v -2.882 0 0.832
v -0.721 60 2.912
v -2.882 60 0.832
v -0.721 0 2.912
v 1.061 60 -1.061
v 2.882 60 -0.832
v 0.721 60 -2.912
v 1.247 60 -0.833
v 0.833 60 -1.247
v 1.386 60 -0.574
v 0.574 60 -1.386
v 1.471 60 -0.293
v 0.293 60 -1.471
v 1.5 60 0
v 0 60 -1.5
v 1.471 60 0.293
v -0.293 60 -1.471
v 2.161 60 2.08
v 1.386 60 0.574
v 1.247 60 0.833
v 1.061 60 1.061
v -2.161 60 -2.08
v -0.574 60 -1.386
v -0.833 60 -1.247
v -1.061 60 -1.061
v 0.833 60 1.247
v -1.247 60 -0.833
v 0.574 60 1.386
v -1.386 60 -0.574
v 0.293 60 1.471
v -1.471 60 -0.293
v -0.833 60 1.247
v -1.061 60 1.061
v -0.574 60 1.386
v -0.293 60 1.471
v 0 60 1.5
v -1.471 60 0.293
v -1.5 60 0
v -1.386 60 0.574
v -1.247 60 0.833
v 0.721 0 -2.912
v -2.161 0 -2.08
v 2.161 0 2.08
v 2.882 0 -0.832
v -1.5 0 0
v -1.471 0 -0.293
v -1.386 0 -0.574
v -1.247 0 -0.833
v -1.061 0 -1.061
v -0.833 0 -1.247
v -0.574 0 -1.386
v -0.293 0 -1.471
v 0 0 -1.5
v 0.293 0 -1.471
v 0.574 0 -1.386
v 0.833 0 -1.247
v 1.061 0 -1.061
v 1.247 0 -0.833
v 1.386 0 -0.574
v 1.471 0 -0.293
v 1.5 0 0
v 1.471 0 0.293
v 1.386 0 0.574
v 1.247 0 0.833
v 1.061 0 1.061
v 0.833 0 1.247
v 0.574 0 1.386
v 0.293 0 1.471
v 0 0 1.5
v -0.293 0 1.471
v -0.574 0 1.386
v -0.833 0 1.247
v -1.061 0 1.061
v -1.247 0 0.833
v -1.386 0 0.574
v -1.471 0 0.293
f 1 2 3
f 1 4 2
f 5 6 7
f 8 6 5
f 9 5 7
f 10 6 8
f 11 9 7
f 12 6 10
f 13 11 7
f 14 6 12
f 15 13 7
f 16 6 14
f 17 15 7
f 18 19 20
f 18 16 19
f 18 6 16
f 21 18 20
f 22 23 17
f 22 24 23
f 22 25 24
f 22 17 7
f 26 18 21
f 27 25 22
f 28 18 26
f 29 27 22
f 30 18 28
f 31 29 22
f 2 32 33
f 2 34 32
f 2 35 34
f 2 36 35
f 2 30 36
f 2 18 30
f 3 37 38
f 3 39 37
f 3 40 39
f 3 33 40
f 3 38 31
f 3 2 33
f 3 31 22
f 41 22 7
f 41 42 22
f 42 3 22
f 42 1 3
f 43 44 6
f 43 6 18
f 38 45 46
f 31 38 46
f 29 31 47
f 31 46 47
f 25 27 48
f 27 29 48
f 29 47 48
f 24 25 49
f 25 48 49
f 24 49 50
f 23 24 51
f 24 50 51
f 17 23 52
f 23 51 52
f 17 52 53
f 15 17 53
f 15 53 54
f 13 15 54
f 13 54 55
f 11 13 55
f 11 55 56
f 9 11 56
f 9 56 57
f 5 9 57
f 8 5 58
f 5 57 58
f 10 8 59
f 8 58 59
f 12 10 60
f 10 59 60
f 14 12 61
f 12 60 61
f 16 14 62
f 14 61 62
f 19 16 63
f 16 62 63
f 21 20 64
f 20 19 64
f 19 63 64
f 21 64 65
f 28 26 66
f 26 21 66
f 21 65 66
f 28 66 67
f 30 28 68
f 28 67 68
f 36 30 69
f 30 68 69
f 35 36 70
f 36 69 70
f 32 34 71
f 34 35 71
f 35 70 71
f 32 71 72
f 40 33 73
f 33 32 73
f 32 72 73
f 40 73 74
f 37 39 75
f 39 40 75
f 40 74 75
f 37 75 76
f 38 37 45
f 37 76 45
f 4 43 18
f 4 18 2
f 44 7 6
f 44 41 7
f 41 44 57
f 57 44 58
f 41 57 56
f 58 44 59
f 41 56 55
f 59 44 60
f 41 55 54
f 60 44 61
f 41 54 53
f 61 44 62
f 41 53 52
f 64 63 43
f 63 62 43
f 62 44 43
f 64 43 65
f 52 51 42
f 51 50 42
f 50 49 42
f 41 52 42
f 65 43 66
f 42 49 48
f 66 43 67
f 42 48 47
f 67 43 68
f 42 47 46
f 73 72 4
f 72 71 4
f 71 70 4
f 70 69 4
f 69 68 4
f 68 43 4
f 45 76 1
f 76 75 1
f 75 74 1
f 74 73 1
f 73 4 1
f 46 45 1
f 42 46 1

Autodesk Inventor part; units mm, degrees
ref_plane "YZ Plane" through (0, 0, 0) normal (1, 0, 0) x (0, 1, 0)
ref_plane "XZ Plane" through (0, 0, 0) normal (0, 1, 0) x (-1, 0, 0)
ref_plane "XY Plane" through (0, 0, 0) normal (0, 0, 1) x (1, 0, 0)
sketch "Sketch1" plane through (0, 0, 0) normal (0, 1, 0) x (-1, 0, 0)
  circle A0 centre (0, 0) radius 1.5
  line L0 (-0.7211, -2.912) -> (-2.8825, -0.8315)
  line L1 (-2.8825, -0.8315) -> (-2.1614, 2.0805)
  line L2 (-2.1614, 2.0805) -> (0.7211, 2.912)
  line L3 (0.7211, 2.912) -> (2.8825, 0.8315)
  line L4 (2.8825, 0.8315) -> (2.1614, -2.0805)
  line L5 (2.1614, -2.0805) -> (-0.7211, -2.912)
  dimension "d0" = 3
  dimension "d1" = 6
extrude "Extrusion1" add sketch "Sketch1" along normal blind 60
thread "Thread1" size "M3x0.5" class "6H" standard "ANSI Metric M Profile" length 10
thread "Thread2" size "M3x0.5" class "6H" standard "ANSI Metric M Profile" length 10
properties part number "Spacer60"
